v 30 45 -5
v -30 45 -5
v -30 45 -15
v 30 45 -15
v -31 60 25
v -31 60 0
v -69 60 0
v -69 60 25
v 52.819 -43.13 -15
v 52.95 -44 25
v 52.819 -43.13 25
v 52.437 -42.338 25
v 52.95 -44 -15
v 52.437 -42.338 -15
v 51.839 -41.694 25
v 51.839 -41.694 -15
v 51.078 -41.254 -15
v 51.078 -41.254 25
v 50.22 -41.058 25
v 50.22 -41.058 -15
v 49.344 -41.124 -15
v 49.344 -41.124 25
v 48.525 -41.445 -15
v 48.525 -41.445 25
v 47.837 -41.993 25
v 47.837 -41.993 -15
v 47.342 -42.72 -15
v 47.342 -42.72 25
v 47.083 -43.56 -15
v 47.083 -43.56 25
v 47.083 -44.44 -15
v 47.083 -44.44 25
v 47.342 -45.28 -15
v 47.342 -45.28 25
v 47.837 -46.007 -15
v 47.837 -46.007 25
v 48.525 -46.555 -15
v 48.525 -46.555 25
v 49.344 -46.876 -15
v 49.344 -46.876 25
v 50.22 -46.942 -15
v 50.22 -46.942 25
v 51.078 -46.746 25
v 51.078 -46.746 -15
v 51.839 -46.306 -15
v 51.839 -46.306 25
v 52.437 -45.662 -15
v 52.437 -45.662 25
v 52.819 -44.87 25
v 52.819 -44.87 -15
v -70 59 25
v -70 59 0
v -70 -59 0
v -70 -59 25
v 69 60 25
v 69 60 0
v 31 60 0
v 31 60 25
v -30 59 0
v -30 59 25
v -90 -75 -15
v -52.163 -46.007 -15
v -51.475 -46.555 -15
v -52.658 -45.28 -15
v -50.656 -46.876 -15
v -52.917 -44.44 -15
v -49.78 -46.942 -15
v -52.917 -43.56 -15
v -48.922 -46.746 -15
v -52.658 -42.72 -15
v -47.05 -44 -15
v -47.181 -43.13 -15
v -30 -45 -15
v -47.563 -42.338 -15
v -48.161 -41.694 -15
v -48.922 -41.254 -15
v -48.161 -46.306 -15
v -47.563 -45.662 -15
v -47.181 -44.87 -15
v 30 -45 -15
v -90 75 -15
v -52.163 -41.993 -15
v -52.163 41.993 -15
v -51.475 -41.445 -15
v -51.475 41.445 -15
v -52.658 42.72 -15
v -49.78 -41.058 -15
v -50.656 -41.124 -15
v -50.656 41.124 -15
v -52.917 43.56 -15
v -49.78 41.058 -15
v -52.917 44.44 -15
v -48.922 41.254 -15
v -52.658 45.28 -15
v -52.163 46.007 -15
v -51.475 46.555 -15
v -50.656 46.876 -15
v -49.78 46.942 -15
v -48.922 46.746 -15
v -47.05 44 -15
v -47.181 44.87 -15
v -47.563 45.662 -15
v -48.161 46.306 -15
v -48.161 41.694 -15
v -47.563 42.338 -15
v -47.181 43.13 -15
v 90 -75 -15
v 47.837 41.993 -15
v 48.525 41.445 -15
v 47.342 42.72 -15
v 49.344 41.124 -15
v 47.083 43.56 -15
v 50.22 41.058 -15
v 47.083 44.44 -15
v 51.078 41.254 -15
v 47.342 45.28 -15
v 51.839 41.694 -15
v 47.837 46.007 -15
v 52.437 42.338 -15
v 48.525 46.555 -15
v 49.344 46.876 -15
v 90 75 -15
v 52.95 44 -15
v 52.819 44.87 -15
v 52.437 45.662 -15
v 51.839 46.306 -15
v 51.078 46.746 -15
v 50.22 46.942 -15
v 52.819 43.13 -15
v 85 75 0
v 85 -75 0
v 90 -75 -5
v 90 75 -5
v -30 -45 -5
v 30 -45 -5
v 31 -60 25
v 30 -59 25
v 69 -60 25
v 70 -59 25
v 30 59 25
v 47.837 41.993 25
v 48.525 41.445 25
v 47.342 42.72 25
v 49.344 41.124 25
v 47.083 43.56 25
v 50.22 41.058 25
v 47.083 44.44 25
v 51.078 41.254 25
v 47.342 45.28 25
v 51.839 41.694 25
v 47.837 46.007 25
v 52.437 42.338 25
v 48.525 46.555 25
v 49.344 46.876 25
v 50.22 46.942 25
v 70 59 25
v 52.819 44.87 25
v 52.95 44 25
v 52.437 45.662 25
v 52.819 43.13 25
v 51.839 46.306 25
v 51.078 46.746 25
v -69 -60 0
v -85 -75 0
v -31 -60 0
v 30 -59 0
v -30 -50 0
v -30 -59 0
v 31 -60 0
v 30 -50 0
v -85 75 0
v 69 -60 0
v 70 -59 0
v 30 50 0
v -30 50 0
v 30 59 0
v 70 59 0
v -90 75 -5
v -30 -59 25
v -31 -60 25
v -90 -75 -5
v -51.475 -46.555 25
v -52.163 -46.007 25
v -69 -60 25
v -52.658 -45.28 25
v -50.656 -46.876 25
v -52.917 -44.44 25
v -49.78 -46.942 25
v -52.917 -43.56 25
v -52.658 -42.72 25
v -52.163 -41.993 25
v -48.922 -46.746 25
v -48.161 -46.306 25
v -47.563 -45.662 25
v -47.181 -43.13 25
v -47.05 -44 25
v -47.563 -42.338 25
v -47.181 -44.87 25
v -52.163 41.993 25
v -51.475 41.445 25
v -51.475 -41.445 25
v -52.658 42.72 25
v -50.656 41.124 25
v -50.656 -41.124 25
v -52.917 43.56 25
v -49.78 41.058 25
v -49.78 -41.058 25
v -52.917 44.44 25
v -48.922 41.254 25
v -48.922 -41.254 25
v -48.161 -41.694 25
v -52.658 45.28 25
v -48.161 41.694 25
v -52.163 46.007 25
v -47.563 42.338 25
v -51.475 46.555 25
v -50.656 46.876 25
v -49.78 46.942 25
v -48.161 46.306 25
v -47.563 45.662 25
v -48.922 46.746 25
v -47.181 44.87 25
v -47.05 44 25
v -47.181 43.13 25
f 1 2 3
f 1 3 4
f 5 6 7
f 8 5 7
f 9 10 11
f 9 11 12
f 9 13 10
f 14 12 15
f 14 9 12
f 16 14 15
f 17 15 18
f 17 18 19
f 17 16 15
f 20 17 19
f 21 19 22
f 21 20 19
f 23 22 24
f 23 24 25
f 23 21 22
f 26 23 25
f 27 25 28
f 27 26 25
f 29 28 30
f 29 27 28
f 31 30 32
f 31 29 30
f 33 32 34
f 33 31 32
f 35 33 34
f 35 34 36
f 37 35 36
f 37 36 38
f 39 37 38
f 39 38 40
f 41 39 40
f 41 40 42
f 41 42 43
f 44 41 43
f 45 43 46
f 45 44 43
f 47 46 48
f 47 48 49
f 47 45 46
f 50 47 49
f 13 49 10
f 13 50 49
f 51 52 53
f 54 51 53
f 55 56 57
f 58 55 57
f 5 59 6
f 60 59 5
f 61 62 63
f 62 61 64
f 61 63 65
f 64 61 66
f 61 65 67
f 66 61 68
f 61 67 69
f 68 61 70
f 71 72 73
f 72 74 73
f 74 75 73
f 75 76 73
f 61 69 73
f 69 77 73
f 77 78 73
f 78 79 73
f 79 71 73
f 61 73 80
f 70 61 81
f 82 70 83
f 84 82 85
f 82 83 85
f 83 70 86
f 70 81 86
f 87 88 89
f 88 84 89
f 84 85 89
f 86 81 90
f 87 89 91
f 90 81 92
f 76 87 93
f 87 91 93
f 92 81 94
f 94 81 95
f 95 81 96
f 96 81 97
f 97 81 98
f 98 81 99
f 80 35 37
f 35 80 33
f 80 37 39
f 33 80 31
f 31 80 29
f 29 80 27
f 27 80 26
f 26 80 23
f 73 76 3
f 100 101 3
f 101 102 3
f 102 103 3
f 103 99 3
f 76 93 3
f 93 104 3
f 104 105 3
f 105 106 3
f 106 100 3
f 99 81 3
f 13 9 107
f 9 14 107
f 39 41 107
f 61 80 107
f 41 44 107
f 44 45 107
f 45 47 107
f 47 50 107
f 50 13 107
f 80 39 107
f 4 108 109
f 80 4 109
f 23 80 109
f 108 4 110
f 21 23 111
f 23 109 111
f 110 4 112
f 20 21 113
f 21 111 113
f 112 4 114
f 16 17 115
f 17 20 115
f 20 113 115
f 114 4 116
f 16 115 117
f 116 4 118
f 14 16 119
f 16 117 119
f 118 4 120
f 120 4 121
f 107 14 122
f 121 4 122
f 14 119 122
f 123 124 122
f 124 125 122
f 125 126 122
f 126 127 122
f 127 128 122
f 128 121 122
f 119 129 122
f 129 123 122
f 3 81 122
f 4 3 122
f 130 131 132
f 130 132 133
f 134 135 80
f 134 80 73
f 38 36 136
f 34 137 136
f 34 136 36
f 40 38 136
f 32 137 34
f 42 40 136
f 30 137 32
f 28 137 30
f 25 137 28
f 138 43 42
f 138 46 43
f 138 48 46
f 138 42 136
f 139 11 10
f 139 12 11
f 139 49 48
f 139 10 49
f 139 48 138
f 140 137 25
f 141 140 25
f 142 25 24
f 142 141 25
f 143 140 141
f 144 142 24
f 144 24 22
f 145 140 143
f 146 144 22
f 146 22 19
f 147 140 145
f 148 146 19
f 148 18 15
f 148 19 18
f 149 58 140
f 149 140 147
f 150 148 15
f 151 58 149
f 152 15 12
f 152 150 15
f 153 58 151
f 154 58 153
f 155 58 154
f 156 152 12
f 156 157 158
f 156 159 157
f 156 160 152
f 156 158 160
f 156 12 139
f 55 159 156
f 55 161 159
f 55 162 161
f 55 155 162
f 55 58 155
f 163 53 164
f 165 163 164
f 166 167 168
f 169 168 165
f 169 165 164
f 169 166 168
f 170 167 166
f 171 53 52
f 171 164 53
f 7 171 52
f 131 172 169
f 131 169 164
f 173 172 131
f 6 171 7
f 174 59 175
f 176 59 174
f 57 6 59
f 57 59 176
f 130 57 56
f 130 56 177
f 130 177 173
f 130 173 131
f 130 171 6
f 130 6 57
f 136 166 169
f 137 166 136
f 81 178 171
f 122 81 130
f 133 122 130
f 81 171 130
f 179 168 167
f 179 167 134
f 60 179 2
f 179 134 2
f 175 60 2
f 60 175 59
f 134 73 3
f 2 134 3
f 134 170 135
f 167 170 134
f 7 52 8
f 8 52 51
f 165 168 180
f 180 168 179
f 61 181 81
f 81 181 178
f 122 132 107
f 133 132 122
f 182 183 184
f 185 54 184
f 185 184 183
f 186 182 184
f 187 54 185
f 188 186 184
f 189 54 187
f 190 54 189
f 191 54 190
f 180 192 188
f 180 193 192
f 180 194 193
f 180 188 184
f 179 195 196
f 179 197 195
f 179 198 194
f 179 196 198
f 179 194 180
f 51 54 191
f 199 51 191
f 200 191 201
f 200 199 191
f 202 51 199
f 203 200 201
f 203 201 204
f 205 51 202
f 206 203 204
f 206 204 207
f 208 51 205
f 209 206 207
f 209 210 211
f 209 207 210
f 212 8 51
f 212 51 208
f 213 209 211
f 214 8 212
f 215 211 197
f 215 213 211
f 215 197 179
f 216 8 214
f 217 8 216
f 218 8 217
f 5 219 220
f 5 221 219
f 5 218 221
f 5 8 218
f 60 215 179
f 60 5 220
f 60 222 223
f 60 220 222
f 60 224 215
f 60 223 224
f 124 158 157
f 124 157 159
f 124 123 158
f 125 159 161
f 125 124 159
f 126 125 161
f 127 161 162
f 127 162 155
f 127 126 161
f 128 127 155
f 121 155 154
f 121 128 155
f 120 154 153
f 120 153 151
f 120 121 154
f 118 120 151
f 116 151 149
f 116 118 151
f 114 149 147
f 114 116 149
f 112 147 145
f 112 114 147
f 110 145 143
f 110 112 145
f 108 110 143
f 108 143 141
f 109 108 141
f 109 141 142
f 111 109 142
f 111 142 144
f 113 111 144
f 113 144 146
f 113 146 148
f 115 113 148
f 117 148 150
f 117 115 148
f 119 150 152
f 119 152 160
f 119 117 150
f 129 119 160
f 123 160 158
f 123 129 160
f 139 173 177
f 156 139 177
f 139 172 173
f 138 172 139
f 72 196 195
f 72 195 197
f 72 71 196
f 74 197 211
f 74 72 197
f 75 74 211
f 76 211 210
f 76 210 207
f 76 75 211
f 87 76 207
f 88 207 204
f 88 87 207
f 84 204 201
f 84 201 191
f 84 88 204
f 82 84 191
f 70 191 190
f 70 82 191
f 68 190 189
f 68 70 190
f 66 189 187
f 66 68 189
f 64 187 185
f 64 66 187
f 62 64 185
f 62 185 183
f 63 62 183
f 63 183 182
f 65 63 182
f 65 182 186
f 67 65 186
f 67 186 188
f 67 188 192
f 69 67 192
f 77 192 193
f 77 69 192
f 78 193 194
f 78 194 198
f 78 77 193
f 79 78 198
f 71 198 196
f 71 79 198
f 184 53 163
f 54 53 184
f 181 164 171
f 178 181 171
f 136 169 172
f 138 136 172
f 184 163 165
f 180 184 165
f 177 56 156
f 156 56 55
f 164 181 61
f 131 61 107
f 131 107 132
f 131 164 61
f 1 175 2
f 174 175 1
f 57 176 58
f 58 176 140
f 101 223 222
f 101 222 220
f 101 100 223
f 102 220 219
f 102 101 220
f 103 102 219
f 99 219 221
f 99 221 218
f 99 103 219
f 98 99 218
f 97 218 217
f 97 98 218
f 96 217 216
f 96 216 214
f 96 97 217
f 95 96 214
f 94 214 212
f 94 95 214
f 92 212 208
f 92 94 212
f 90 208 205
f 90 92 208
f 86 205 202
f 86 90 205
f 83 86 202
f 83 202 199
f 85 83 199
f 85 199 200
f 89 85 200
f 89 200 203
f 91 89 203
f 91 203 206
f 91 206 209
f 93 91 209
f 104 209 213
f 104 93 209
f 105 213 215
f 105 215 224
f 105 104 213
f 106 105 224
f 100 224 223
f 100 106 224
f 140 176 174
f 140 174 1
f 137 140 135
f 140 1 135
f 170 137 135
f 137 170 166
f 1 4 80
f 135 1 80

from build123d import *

# Parameters (mm, degrees)
F0_W     = 180
F0_H     = 150
F0_R     = 2.95
F1_DEPTH = 15
F2_DEPTH = 25
F3_SIZE  = 1
F4_SIZE  = 5


with BuildPart() as f1:
    # F0 (on Top) → F1 (new body)
    with BuildSketch(Plane.XY):
        Rectangle(F0_W, F0_H)
        Polygon((-30, 45), (30, 45), (30, 60), (70, 60), (70, -60), (30, -60), (30, -45), (-30, -45), (-30, -60), (-70, -60), (-70, 60), (-30, 60), align=None, mode=Mode.SUBTRACT)
        Polygon((-30, -45), (-30, 45), (-30, 60), (-70, 60), (-70, -60), (-30, -60), align=None)
        with Locations((-50, -44)):
            Circle(F0_R, mode=Mode.SUBTRACT)
        with Locations((-50, 44)):
            Circle(F0_R, mode=Mode.SUBTRACT)
        Polygon((30, 60), (30, 45), (30, -45), (30, -60), (70, -60), (70, 60), align=None)
        with Locations((50, -44)):
            Circle(F0_R, mode=Mode.SUBTRACT)
        with Locations((50, 44)):
            Circle(F0_R, mode=Mode.SUBTRACT)
    extrude(amount=-F1_DEPTH)

    # F0 (on Top) → F2 (join)
    with BuildSketch(Plane.XY):
        Polygon((-30, -45), (-30, 45), (-30, 60), (-70, 60), (-70, -60), (-30, -60), align=None)
        with Locations((-50, -44)):
            Circle(F0_R, mode=Mode.SUBTRACT)
        with Locations((-50, 44)):
            Circle(F0_R, mode=Mode.SUBTRACT)
        Polygon((30, 60), (30, 45), (30, -45), (30, -60), (70, -60), (70, 60), align=None)
        with Locations((50, -44)):
            Circle(F0_R, mode=Mode.SUBTRACT)
        with Locations((50, 44)):
            Circle(F0_R, mode=Mode.SUBTRACT)
    extrude(amount=F2_DEPTH)

    # F3
    f3_edges = [f1.edges().sort_by_distance(p)[0] for p in [
        (-70, -60, 12.5),
        (-30, -60, 12.5),
        (30, -60, 12.5),
        (70, -60, 12.5),
        (70, 60, 12.5),
        (30, 60, 12.5),
        (-30, 60, 12.5),
        (-70, 60, 12.5),
    ]]
    chamfer(f3_edges, length=F3_SIZE)

    # F4
    f4_edges = [f1.edges().sort_by_distance(p)[0] for p in [
        (0, 45, 0),
        (0, -45, 0),
        (-90, 0, 0),
        (90, 0, 0),
    ]]
    chamfer(f4_edges, length=F4_SIZE)


solid = f1.part
